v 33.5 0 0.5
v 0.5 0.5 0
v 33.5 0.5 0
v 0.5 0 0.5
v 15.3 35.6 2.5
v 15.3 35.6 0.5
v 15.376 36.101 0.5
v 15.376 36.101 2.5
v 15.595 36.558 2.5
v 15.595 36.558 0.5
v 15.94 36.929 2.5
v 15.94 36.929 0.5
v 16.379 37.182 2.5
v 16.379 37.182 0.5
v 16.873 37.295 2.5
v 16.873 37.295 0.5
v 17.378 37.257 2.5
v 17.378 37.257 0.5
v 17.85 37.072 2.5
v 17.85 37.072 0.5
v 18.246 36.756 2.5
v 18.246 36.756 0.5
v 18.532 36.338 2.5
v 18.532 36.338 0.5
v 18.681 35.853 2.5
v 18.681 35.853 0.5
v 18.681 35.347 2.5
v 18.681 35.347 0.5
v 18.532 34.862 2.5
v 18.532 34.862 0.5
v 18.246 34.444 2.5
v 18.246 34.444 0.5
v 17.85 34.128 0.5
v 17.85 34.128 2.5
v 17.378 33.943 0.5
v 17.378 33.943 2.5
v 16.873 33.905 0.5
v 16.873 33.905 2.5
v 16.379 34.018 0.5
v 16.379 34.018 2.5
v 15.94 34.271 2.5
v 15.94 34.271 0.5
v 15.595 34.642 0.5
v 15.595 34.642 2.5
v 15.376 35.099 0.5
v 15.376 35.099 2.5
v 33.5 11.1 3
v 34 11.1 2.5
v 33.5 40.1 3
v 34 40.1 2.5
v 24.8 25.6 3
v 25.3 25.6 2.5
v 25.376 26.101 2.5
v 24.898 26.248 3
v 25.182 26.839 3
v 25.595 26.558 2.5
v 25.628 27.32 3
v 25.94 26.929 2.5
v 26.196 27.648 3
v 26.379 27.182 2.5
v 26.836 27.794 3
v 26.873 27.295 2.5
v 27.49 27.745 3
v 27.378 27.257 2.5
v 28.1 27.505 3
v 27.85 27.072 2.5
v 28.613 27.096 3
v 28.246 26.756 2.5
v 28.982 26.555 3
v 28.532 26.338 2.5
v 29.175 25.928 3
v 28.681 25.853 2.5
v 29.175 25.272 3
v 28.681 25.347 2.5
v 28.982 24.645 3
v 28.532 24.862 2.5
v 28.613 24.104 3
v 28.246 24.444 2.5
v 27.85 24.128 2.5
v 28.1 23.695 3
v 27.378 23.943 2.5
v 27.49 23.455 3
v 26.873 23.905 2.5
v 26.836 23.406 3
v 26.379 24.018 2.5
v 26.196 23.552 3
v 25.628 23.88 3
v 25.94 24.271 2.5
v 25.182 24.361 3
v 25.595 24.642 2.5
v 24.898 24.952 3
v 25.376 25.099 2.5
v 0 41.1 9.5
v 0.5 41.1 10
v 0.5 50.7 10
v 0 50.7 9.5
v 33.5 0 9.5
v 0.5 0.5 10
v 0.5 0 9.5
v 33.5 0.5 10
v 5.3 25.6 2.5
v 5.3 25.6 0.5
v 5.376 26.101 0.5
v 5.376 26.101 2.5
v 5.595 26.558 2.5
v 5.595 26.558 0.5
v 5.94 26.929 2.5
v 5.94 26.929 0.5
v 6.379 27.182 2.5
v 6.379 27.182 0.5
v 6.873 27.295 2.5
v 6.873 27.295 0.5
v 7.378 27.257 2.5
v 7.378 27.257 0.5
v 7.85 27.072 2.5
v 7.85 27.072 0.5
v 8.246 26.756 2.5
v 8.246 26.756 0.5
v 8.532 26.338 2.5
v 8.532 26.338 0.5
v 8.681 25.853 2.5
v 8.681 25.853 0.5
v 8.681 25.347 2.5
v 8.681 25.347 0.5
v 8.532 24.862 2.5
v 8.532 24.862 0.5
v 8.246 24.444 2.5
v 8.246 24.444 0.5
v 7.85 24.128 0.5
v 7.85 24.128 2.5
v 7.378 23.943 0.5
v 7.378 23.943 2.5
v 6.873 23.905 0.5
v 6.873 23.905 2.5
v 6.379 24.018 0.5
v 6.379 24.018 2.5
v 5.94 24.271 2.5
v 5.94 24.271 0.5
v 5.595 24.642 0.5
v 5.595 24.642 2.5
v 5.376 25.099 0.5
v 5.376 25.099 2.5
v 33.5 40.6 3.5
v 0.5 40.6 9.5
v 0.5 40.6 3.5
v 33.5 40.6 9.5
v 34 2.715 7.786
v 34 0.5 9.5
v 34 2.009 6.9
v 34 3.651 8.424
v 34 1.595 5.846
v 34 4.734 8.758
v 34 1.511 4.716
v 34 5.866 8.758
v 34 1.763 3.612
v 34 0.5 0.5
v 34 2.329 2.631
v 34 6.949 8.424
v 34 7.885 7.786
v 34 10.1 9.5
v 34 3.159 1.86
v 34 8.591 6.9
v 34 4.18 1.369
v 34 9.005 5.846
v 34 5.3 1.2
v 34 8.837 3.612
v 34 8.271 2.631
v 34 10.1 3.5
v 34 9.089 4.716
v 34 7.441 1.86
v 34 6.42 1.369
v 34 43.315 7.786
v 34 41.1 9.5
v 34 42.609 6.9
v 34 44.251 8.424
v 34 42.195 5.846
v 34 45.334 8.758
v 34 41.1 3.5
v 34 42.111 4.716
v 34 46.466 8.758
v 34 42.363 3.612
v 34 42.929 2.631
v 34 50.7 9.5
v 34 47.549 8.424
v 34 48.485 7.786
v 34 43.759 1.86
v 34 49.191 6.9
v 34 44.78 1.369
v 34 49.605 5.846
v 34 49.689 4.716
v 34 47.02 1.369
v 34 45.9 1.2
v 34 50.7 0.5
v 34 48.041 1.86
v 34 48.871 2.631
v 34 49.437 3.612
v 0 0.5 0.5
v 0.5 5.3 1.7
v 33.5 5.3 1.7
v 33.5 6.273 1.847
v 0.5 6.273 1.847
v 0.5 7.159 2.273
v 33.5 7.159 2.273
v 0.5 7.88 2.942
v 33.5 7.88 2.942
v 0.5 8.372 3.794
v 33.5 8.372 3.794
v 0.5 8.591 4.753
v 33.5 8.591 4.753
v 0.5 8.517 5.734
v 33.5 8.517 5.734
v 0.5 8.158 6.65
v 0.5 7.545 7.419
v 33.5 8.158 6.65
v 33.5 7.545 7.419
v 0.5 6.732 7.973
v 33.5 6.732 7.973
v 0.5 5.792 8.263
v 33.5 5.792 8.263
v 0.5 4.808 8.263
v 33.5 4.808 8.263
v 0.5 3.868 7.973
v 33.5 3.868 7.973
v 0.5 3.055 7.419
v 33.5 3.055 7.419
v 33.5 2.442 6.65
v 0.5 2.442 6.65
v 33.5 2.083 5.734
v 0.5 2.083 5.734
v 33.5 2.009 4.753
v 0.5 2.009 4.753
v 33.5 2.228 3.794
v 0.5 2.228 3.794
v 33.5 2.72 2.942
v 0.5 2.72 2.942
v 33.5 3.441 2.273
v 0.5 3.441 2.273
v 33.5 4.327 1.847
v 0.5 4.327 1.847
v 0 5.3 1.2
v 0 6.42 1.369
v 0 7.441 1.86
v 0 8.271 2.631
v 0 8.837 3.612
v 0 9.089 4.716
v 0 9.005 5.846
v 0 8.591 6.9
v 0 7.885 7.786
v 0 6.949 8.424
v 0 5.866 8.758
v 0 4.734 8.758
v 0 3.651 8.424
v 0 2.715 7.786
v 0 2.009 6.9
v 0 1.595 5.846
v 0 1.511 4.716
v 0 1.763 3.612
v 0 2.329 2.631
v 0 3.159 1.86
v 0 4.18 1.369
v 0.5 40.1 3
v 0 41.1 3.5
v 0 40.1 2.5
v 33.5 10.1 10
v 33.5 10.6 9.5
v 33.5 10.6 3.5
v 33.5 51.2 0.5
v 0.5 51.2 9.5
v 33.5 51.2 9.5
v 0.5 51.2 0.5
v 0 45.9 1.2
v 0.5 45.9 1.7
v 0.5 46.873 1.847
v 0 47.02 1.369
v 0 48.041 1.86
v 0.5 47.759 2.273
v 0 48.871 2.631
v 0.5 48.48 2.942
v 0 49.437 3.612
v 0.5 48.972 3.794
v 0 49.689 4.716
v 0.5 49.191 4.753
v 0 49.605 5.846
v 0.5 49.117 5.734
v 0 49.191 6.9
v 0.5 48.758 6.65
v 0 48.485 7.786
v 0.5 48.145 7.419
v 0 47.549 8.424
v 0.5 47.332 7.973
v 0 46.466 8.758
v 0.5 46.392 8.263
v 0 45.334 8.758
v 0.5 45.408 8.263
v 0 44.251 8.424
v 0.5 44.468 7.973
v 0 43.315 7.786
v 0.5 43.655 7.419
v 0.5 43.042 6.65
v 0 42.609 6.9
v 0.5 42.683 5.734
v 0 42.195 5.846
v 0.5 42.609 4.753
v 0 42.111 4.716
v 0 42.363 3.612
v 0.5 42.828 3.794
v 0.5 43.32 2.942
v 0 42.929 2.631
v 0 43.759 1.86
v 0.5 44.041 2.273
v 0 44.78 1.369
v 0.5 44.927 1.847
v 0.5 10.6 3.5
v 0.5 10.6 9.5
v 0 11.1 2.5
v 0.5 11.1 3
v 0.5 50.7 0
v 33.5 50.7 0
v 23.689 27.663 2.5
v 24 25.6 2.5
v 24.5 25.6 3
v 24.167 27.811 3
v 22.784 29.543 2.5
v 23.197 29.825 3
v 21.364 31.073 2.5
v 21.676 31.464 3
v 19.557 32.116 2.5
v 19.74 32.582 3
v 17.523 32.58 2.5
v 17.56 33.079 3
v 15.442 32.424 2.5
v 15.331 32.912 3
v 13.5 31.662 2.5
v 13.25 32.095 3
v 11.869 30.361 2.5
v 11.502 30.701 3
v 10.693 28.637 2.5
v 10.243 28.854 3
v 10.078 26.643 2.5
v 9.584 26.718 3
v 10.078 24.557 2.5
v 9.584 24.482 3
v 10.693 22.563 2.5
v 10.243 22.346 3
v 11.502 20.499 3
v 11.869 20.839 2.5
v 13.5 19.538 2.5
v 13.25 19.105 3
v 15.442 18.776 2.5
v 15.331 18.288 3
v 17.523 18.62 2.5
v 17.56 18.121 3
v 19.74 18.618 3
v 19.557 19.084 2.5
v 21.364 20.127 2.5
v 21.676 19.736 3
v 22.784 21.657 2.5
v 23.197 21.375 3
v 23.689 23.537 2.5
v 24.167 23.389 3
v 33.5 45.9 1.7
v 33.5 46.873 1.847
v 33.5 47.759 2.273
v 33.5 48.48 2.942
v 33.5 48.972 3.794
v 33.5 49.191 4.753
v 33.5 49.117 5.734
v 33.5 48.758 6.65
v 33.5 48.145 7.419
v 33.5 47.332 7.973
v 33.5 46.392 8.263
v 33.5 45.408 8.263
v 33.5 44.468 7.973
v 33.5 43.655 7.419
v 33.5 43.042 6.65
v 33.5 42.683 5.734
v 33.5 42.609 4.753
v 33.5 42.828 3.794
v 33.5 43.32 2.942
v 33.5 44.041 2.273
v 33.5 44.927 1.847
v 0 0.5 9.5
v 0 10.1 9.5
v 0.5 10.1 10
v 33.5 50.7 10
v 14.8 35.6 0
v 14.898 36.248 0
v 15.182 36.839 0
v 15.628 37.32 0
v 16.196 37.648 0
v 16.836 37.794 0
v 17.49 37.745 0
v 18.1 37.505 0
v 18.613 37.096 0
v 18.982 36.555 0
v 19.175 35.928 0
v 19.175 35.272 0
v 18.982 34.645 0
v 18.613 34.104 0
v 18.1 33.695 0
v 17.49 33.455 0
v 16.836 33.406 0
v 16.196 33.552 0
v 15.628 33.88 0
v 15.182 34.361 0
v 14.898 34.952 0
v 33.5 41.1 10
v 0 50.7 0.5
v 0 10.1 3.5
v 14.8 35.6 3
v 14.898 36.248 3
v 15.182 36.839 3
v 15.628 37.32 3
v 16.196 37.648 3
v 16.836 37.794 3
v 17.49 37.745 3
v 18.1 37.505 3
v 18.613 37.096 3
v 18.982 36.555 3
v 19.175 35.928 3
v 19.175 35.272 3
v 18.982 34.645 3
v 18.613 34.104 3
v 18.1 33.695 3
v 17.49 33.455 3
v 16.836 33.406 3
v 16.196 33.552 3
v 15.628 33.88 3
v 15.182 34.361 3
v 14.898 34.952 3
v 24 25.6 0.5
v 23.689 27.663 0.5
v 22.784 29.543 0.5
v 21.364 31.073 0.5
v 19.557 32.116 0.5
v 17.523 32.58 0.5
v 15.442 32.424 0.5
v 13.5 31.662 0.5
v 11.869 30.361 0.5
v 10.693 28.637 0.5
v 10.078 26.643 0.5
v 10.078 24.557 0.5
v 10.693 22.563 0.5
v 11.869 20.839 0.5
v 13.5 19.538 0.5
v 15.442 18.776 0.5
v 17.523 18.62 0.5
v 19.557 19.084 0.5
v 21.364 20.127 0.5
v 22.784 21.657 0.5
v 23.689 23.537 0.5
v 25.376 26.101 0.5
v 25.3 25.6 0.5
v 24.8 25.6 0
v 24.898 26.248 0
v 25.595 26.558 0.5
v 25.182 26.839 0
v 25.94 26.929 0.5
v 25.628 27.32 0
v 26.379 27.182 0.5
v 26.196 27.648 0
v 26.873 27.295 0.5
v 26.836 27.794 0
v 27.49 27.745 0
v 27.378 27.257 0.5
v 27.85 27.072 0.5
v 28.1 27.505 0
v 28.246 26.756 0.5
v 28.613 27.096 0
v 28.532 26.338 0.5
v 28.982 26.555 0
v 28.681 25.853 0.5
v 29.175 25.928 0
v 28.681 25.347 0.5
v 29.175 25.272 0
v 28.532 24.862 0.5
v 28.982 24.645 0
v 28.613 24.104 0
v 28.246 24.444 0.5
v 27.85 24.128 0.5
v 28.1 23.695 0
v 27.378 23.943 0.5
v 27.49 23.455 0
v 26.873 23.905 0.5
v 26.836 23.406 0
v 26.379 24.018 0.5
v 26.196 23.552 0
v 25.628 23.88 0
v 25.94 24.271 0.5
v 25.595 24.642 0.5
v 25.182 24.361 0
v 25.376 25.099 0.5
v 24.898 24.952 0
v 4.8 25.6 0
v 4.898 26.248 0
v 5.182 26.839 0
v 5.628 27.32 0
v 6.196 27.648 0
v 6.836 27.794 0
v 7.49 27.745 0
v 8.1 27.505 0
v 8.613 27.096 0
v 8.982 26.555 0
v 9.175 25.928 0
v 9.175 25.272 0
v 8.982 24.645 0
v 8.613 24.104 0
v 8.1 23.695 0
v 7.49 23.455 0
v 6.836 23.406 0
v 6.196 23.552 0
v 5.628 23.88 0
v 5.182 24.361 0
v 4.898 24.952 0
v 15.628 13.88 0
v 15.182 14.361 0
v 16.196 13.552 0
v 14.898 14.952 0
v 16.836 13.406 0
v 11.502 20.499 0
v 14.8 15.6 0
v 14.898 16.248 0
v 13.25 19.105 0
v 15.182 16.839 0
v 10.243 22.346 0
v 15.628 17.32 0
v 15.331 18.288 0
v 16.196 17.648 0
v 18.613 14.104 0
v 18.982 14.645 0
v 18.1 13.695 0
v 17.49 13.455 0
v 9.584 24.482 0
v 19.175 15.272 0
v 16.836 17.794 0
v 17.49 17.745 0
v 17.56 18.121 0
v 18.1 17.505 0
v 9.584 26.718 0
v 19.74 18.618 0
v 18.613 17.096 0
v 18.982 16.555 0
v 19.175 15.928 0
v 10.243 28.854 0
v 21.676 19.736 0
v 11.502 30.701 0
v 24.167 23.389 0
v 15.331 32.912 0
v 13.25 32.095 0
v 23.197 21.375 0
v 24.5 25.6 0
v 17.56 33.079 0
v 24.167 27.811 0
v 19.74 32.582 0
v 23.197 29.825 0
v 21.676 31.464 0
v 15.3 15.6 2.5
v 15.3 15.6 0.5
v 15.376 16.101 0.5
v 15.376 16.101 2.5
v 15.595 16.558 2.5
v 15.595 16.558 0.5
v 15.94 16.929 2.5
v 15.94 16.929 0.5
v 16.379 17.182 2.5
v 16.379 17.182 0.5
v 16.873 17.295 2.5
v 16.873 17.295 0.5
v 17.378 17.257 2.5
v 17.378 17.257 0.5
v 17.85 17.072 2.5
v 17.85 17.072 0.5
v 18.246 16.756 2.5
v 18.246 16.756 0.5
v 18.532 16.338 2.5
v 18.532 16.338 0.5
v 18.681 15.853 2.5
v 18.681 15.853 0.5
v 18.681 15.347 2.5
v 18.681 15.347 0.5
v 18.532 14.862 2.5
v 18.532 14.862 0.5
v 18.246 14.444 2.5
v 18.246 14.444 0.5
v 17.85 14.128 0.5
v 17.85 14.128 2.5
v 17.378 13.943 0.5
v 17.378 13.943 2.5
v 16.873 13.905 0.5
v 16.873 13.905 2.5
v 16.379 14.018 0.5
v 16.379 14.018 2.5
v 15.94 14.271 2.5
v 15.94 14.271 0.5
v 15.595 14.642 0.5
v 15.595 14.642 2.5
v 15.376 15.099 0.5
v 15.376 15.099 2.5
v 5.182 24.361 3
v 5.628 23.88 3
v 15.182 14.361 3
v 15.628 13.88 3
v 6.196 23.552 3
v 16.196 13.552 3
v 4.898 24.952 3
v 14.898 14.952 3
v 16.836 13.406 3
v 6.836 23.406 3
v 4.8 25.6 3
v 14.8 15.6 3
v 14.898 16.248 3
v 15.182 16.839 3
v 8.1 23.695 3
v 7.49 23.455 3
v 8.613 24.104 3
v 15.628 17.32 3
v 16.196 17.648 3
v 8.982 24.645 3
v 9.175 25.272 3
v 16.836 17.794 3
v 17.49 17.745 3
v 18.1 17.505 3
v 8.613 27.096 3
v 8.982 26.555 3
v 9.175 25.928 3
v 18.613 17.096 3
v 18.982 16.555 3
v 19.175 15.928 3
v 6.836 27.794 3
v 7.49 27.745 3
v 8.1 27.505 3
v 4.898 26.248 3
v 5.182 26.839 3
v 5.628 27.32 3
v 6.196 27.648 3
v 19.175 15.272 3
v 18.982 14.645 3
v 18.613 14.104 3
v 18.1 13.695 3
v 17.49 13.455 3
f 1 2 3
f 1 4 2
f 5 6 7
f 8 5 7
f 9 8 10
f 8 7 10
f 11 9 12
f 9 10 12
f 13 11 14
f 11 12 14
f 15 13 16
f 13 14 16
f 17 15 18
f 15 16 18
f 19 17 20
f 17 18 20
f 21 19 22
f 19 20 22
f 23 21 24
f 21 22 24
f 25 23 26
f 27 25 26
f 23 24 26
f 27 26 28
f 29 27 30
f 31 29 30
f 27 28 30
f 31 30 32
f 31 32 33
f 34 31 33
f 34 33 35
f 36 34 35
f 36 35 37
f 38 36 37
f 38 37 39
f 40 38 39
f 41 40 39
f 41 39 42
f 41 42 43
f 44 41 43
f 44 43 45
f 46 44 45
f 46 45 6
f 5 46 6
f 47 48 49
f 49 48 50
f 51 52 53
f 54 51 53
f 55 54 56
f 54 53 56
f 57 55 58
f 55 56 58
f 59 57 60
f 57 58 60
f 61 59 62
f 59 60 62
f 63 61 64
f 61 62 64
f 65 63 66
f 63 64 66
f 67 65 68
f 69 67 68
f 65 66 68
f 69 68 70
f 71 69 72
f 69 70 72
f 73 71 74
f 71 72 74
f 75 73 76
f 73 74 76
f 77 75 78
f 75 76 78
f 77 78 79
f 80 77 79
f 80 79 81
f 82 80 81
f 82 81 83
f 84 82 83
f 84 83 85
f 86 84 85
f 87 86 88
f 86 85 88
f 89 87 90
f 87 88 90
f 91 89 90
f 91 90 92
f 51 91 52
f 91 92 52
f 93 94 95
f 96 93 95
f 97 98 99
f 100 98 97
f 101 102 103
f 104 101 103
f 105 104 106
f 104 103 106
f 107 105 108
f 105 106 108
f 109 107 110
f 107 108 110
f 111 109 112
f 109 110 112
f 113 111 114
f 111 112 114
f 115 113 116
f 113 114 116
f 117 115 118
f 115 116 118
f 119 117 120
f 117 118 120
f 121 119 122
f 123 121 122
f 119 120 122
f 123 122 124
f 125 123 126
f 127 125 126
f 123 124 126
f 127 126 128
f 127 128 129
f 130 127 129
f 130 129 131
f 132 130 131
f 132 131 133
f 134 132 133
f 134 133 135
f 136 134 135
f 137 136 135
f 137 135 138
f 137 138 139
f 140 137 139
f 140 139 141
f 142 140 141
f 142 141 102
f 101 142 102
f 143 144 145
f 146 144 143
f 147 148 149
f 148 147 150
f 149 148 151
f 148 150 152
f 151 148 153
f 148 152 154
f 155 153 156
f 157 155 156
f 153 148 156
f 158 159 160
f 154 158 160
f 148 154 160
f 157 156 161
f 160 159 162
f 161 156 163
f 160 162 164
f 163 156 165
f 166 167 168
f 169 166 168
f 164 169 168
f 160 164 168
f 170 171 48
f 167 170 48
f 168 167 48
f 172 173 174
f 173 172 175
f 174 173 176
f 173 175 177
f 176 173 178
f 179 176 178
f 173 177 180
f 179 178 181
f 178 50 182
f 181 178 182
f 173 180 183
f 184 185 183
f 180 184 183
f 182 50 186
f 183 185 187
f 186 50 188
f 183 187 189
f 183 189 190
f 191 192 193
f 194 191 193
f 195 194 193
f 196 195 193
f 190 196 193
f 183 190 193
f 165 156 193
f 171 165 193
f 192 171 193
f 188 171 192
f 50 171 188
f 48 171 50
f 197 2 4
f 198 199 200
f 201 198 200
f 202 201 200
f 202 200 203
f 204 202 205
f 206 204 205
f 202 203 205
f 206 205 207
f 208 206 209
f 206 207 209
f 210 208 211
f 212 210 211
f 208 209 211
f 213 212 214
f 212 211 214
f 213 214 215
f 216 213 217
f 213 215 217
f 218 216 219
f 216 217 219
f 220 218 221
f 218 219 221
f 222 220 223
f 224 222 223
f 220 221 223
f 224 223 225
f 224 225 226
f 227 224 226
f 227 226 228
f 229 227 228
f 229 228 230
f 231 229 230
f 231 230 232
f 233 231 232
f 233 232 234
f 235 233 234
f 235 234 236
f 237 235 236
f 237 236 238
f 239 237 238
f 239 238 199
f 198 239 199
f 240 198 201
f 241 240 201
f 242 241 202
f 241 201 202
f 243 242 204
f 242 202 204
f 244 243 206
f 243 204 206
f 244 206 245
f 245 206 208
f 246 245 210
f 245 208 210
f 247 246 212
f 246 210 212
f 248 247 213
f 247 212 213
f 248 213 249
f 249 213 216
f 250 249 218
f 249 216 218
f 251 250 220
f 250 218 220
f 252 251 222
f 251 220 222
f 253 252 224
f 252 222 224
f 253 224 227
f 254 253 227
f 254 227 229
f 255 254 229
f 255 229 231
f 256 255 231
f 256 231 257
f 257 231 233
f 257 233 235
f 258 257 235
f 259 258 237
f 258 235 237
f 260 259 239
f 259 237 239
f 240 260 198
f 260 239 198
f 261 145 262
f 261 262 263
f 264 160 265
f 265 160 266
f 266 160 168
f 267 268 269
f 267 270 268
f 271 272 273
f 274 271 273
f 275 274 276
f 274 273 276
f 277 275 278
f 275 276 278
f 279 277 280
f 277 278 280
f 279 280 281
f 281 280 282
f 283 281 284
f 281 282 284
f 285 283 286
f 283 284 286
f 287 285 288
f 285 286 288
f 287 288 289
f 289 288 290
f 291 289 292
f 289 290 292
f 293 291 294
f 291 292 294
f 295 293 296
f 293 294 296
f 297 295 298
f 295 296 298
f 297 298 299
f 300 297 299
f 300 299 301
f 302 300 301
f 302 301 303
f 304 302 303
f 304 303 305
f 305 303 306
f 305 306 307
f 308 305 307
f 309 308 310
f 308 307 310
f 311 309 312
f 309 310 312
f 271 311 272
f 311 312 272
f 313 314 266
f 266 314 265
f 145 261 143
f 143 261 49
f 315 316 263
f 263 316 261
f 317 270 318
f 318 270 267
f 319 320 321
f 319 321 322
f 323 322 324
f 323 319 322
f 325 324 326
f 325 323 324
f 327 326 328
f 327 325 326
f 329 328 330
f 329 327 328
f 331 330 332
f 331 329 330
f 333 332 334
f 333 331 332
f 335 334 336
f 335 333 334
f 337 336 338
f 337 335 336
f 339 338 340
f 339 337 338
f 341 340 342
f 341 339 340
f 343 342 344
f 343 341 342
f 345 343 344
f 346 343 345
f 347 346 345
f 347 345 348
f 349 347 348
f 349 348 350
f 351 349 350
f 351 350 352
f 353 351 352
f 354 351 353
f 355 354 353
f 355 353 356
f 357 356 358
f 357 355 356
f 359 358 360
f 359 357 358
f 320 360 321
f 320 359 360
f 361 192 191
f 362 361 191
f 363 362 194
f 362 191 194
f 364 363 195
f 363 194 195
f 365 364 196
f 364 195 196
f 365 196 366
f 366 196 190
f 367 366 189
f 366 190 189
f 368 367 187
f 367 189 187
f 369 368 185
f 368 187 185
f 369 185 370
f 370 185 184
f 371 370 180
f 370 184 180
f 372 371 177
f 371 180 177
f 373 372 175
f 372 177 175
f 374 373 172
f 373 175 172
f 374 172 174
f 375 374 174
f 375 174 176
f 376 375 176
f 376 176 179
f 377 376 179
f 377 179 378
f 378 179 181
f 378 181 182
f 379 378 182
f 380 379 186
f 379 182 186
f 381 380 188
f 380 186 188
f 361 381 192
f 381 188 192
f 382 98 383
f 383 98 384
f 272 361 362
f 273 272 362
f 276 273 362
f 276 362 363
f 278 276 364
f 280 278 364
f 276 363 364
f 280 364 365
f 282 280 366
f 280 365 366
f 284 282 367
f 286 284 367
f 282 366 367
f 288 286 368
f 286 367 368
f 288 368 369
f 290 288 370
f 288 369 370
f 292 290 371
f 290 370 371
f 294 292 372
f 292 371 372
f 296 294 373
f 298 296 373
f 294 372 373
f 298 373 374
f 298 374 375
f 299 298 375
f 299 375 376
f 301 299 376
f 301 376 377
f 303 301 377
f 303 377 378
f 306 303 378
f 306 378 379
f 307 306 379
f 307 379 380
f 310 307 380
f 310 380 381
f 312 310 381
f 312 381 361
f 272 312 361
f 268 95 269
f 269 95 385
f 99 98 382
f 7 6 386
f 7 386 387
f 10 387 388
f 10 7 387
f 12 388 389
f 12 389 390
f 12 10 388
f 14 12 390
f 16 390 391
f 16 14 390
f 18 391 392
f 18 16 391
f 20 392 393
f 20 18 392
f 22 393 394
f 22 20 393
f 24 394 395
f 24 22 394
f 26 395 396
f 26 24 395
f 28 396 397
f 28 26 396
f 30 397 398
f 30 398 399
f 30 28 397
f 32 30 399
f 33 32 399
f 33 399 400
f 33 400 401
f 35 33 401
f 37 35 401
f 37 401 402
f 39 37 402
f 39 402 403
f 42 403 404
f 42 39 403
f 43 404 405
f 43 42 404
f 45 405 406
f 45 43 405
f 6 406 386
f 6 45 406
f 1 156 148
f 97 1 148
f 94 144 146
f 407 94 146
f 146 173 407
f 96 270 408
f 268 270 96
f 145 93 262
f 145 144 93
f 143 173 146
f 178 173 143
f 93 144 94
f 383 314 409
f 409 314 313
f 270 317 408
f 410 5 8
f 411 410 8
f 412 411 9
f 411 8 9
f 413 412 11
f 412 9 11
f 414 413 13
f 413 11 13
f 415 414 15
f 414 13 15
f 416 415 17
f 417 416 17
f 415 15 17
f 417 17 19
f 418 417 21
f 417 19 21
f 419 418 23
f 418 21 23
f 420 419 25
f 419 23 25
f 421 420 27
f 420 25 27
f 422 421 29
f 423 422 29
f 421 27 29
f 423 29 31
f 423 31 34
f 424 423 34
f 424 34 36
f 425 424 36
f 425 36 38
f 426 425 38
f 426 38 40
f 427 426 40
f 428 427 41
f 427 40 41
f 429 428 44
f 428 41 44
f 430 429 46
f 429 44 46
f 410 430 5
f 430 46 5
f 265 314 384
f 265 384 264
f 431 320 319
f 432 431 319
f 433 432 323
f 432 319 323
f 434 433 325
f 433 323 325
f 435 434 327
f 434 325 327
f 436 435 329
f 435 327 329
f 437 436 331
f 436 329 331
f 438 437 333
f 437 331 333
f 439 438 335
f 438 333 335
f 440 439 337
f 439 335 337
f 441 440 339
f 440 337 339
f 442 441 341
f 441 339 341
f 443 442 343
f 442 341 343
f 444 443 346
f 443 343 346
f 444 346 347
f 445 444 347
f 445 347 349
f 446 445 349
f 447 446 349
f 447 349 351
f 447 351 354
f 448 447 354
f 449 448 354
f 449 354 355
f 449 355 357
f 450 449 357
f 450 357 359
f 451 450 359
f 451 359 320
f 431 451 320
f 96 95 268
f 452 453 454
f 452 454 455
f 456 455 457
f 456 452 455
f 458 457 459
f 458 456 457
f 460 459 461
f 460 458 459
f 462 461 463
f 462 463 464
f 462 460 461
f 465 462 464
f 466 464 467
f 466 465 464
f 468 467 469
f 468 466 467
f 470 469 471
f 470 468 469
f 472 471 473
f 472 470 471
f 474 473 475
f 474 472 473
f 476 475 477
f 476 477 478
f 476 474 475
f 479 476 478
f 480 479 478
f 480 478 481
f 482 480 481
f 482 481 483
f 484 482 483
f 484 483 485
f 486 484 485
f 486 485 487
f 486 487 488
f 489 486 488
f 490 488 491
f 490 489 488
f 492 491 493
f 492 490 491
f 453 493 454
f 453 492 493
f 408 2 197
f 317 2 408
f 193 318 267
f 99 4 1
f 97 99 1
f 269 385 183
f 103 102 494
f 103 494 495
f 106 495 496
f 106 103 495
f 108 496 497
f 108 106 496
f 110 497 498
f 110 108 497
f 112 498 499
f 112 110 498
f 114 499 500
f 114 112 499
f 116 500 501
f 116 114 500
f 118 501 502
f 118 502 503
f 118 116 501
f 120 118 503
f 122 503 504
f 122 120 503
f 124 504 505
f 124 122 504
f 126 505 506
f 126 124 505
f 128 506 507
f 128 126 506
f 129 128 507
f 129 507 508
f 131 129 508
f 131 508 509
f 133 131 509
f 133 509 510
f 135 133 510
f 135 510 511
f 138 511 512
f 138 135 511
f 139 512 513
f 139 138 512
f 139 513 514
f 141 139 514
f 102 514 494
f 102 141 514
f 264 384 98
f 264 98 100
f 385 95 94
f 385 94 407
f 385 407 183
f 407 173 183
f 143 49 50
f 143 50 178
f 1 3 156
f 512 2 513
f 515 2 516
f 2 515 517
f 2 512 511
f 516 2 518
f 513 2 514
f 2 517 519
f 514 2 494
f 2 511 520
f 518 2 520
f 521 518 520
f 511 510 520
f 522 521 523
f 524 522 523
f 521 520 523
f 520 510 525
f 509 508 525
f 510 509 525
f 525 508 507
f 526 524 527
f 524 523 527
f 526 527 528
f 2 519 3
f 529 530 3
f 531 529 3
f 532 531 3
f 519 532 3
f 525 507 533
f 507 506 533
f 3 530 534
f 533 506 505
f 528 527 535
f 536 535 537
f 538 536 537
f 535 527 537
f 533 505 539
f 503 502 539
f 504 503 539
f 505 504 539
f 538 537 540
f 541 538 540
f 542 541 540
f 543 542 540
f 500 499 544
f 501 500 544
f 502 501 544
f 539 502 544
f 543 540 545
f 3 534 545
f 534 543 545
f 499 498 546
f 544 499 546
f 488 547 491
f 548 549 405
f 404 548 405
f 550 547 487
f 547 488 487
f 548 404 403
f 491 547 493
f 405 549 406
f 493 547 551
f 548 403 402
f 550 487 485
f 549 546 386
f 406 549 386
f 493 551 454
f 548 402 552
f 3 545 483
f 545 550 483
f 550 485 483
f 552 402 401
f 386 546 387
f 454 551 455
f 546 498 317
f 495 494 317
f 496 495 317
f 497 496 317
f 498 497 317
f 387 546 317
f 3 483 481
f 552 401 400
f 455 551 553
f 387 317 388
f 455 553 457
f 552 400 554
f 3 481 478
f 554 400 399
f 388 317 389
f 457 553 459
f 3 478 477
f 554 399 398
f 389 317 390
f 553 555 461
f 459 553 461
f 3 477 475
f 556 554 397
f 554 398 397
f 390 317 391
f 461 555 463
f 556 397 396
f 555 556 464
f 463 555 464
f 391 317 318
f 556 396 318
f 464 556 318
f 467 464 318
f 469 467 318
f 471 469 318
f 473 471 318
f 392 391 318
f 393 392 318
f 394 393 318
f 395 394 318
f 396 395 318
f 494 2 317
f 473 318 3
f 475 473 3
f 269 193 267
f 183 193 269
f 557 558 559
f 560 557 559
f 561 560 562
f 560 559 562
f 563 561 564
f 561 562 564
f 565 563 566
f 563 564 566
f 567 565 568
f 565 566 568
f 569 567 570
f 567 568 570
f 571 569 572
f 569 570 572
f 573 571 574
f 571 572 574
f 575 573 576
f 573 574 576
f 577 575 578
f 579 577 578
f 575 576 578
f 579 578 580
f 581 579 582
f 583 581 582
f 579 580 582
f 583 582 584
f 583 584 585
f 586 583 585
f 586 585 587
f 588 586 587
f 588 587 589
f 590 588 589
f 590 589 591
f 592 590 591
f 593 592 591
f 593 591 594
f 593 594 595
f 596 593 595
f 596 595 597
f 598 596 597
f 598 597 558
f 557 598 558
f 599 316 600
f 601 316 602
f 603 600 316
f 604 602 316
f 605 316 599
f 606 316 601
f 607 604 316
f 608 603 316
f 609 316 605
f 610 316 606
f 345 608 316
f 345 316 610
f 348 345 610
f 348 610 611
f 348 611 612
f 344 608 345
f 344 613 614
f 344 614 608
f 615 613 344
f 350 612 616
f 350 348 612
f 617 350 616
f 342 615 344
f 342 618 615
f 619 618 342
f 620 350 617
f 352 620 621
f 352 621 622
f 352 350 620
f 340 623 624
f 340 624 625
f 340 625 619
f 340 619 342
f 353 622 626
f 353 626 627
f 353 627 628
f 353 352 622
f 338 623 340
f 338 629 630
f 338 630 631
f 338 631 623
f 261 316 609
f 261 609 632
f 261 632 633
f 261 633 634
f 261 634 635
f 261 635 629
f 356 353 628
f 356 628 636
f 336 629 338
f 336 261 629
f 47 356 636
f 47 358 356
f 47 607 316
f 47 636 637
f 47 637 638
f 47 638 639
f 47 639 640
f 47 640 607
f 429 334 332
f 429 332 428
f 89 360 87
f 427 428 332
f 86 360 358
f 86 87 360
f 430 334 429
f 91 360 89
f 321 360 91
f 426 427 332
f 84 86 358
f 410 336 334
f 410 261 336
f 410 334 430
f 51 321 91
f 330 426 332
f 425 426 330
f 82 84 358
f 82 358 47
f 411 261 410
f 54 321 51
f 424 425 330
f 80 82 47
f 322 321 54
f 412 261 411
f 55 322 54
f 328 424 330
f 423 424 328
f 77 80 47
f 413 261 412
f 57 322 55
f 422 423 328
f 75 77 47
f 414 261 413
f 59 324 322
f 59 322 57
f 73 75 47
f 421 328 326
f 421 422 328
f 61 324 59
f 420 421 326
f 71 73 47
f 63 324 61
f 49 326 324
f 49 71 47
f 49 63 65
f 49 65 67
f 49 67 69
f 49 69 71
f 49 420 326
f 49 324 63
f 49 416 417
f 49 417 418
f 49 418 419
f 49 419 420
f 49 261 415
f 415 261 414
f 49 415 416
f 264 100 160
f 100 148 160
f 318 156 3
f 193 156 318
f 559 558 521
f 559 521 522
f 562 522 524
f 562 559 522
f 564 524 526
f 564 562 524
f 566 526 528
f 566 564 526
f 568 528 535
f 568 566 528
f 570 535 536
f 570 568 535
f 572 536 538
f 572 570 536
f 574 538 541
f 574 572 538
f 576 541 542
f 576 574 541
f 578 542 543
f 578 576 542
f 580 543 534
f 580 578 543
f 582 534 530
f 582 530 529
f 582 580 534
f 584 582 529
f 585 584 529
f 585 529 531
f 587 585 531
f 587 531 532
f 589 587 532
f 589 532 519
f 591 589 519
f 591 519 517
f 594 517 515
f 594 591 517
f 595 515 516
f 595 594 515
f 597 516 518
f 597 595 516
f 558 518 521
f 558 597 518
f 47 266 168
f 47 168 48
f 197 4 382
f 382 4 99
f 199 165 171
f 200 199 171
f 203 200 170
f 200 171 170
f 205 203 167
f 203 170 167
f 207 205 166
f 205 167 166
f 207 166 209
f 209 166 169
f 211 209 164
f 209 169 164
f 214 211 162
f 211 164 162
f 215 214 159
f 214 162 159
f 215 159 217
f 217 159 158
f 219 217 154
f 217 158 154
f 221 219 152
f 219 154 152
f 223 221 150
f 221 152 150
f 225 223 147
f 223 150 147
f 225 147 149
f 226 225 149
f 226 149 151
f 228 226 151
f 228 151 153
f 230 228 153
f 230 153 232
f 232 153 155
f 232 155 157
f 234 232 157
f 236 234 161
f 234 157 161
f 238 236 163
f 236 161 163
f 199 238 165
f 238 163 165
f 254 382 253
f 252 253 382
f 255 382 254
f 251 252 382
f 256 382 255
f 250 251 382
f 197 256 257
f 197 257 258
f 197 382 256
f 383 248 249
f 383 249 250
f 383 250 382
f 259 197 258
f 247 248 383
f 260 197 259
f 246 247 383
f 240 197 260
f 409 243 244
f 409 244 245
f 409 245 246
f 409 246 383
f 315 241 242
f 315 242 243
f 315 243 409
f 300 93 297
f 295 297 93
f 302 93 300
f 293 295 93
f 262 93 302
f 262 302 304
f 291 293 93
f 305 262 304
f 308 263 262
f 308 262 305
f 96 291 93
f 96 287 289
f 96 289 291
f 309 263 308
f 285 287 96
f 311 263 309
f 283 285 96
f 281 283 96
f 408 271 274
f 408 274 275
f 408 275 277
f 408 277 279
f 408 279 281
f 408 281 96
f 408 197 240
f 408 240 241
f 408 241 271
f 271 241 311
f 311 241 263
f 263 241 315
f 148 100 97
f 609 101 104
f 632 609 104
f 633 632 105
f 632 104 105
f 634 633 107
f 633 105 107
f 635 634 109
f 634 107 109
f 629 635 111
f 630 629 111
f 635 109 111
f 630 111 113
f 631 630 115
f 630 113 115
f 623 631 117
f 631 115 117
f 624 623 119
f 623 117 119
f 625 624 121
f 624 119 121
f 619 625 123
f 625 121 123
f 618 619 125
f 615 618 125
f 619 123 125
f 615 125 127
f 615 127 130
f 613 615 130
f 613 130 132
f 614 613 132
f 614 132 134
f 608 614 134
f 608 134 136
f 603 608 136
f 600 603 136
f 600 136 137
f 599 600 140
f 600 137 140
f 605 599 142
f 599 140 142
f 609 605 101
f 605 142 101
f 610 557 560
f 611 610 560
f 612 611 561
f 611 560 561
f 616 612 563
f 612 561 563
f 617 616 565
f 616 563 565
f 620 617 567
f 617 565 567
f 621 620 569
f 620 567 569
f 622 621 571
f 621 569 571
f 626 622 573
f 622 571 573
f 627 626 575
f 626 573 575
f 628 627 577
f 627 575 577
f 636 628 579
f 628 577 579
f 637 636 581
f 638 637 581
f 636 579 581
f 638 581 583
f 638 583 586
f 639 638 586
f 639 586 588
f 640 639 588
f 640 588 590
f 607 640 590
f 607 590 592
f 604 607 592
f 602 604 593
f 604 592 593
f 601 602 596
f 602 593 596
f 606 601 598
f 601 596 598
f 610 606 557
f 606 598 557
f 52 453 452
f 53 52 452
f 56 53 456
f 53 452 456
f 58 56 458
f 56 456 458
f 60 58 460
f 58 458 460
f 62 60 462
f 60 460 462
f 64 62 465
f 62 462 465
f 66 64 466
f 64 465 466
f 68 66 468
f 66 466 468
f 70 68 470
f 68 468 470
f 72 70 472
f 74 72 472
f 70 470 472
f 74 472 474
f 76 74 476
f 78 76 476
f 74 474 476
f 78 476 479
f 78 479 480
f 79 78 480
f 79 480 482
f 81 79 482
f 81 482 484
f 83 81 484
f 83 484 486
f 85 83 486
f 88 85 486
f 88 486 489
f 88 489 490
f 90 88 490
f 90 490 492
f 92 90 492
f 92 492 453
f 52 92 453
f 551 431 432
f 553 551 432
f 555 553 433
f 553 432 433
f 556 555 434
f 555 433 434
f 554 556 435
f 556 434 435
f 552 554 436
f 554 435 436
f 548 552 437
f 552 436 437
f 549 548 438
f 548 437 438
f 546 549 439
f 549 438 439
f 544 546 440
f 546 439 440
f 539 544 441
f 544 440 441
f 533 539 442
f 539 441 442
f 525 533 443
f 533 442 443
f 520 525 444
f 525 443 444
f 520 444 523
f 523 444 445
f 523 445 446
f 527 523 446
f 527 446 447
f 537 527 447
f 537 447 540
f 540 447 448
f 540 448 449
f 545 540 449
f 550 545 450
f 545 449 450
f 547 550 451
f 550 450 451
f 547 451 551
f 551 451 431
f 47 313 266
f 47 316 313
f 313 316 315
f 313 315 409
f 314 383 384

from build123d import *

# Parameters (mm, degrees)
ESQUISSE1_W             = 34
ESQUISSE1_H             = 51.2
BOSS_EXTRU_1_DEPTH      = 10
ESQUISSE4_W             = 34
ESQUISSE4_H             = 30
ENL_V_MAT_EXTRU_1_DEPTH = 7
ESQUISSE5_R             = 7
ENL_V_MAT_EXTRU_2_DEPTH = 62.858224999
D_GAGEMENT_M62_D        = 6.6
D_GAGEMENT_M31_D        = 3.4
CHANFREIN1_SIZE         = 0.5


with BuildPart() as part:
    # Esquisse1 → Boss.-Extru.1 (new body)
    with BuildSketch(Plane.XY):
        with Locations((17, 25.6)):
            Rectangle(ESQUISSE1_W, ESQUISSE1_H)
    extrude(amount=BOSS_EXTRU_1_DEPTH)

    # Esquisse4 → Enlèv. mat.-Extru.1 (cut)
    with BuildSketch(Plane.XY.offset(10)):
        with Locations((17, 25.6)):
            Rectangle(ESQUISSE4_W, ESQUISSE4_H)
    extrude(amount=-ENL_V_MAT_EXTRU_1_DEPTH, mode=Mode.SUBTRACT)

    # Esquisse5 → Enlèv. mat.-Extru.2 (cut, through all)
    with BuildSketch(Plane.XY.offset(3)):
        with Locations((17, 25.6)):
            Circle(ESQUISSE5_R)
    extrude(amount=-ENL_V_MAT_EXTRU_2_DEPTH, mode=Mode.SUBTRACT)

    # Dégagement M62 (through all)
    with Locations(Plane.ZY):
        with Locations((5, 45.9), (5, 5.3)):
            Hole(D_GAGEMENT_M62_D / 2)

    # Dégagement M31 (through all)
    with Locations(Plane.XY.offset(3)):
        with Locations((17, 35.6), (7, 25.6), (17, 15.6), (27, 25.6)):
            Hole(D_GAGEMENT_M31_D / 2)

    # Chanfrein1
    chanfrein1_edges = [part.edges().sort_by_distance(p)[0] for p in [
        (34, 5.3, 10),
        (17, 51.2, 10),
        (0, 5.3, 10),
        (34, 45.9, 10),
        (0, 25.6, 3),
        (0, 10.6, 6.5),
        (17, 40.6, 3),
        (0, 40.6, 6.5),
        (34, 25.6, 3),
        (34, 40.6, 6.5),
        (17, 10.6, 3),
        (34, 10.6, 6.5),
        (17, 10.6, 10),
        (17, 40.6, 10),
        (10, 25.6, 0),
        (10, 25.6, 3),
        (0, 5.3, 8.3),
        (34, 5.3, 8.3),
        (0, 45.9, 10),
        (0, 45.9, 8.3),
        (34, 45.9, 8.3),
        (17, 51.2, 0),
        (34, 25.6, 0),
        (28.7, 25.6, 3),
        (28.7, 25.6, 0),
        (17, 0, 0),
        (18.7, 15.6, 3),
        (18.7, 15.6, 0),
        (0, 25.6, 0),
        (8.7, 25.6, 3),
        (8.7, 25.6, 0),
        (18.7, 35.6, 3),
        (18.7, 35.6, 0),
        (17, 0, 10),
        (0, 51.2, 5),
        (34, 51.2, 5),
        (34, 0, 5),
        (0, 0, 5),
    ]]
    chamfer(chanfrein1_edges, length=CHANFREIN1_SIZE)


solid = part.part
